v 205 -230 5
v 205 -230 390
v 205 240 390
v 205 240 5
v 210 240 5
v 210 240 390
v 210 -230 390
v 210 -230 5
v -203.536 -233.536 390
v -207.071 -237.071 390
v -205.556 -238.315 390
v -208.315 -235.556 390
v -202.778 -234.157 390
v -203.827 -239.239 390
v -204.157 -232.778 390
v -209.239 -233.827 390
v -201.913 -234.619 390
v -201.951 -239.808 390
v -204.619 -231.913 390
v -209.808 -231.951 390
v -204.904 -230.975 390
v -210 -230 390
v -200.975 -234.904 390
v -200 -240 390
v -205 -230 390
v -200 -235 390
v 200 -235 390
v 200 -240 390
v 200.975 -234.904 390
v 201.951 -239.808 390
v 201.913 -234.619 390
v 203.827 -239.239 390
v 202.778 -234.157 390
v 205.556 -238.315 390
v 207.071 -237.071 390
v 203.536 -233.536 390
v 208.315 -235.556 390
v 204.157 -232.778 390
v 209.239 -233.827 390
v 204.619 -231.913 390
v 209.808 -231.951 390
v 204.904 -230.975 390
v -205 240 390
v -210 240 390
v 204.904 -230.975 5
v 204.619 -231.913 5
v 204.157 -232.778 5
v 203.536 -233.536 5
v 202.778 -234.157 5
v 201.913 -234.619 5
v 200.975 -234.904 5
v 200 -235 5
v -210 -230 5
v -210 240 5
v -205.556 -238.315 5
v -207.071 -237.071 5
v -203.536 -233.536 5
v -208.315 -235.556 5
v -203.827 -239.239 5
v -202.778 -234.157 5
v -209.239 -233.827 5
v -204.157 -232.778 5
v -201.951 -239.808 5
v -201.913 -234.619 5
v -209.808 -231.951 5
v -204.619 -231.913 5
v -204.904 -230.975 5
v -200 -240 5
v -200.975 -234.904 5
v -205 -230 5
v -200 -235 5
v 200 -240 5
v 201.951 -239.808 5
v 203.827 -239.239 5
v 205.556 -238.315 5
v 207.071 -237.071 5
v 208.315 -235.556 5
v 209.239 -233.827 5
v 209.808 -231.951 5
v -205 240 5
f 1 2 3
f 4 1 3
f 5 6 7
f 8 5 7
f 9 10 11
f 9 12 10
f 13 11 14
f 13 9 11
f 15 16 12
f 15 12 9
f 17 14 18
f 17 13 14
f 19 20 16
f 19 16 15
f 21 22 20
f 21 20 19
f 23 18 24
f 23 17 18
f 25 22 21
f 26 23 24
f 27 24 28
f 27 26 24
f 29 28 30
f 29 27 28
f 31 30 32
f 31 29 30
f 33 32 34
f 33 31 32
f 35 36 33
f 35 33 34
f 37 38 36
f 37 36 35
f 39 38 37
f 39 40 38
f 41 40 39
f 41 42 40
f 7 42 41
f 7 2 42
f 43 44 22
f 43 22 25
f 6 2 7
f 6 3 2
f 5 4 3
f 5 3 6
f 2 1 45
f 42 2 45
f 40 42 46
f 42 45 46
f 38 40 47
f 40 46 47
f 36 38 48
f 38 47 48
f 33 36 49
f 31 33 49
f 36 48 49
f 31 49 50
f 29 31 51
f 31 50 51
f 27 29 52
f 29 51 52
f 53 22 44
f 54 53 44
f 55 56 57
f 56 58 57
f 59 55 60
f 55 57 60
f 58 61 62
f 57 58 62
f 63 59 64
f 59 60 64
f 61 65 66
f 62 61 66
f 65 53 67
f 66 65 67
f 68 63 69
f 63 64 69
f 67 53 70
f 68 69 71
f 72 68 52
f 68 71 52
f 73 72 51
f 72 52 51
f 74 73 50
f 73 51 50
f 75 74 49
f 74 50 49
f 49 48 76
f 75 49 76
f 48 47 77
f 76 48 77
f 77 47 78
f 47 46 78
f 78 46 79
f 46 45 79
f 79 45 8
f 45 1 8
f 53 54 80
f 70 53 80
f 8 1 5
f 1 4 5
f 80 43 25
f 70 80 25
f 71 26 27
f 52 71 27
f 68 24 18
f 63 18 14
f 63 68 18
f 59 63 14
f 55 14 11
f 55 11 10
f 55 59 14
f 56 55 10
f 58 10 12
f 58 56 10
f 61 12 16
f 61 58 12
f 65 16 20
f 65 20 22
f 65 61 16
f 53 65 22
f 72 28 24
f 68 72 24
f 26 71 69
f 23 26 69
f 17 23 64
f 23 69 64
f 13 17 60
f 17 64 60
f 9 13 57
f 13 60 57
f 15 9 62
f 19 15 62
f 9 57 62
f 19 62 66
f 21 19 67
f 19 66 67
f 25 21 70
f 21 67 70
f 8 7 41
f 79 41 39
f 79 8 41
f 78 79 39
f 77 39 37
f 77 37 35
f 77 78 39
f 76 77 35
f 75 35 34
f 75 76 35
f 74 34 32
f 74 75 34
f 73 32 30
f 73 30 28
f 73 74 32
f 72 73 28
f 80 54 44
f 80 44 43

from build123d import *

# Parameters (mm, degrees)
SKETCH_1_W            = 420
SKETCH_1_H            = 480
EXTRUDE_1_DEPTH       = 5
FILLET_1_R            = 5
EXTRUDE_START         = 385
EXTRUDE_3_DEPTH       = 385
CUT_EXTRUDE_START     = -5
CUT_EXTRUDE_2_DEPTH   = 5
SHEET_START           = 5
SHEET_METAL_1_DEPTH   = 385
SHEET_METAL_1_2_DEPTH = 385


# Read off the part's stored shape, not the designer's step: 转换实体1
with BuildPart() as part:
    # Sketch 1 → 凸台-拉伸1 (new body)
    with BuildSketch(Plane.XY):
        Rectangle(SKETCH_1_W, SKETCH_1_H)
    extrude(amount=EXTRUDE_1_DEPTH)

    # 圆角1
    fillet_1_edges = [part.edges().sort_by_distance(p)[0] for p in [
        (210, -240, 2.5),
        (-210, -240, 2.5),
    ]]
    fillet(fillet_1_edges, radius=FILLET_1_R)

    # 草图4 → 凸台-拉伸3 (add)
    with BuildSketch(Plane.XY.offset(5).offset(EXTRUDE_START)):
        with BuildLine():
            Line((-205, 240), (-205, -235))
            Line((-205, -235), (205, -235))
            Line((205, -235), (205, 240))
            Line((205, 240), (210, 240))
            Line((210, 240), (210, -235))
            ThreePointArc((210, -235), (208.535533906, -238.535533906), (205, -240))
            Line((205, -240), (-205, -240))
            ThreePointArc((-205, -240), (-208.535533906, -238.535533906), (-210, -235))
            Line((-210, -235), (-210, 240))
            Line((-210, 240), (-205, 240))
        make_face()
    extrude(amount=-EXTRUDE_3_DEPTH)

    # 草图5 → 切除-拉伸2 (cut)
    with BuildSketch(Plane(origin=(0, 0, 0), x_dir=(-1, 0, 0), z_dir=(0, 0, -1)).offset(CUT_EXTRUDE_START)):
        with BuildLine():
            Line((-205, -240), (205, -240))
            ThreePointArc((205, -240), (208.535533906, -238.535533906), (210, -235))
            Line((210, -235), (210, 240))
            Line((210, 240), (-210, 240))
            Line((-210, 240), (-210, -235))
            ThreePointArc((-210, -235), (-208.535533906, -238.535533906), (-205, -240))
        make_face()
    extrude(amount=CUT_EXTRUDE_2_DEPTH, mode=Mode.SUBTRACT)

    # Sheet Metal 1 outline → Sheet Metal 1 (cut)
    with BuildSketch(Plane.XY.offset(SHEET_START)):
        with BuildLine():
            Line((-205, -240), (-200, -240))
            ThreePointArc((-200, -240), (-207.071067812, -237.071067812), (-210, -230))
            Line((-210, -230), (-210, -235))
            ThreePointArc((-210, -235), (-208.535533906, -238.535533906), (-205, -240))
        make_face()
        with BuildLine():
            ThreePointArc((210, -230), (207.071067812, -237.071067812), (200, -240))
            Line((200, -240), (205, -240))
            ThreePointArc((205, -240), (208.535533906, -238.535533906), (210, -235))
            Line((210, -235), (210, -230))
        make_face()
    extrude(amount=SHEET_METAL_1_DEPTH, mode=Mode.SUBTRACT)

    # Sheet Metal 1 2 outline → Sheet Metal 1 2 (add)
    with BuildSketch(Plane.XY.offset(SHEET_START)):
        with BuildLine():
            Line((-205, -235), (-200, -235))
            ThreePointArc((-200, -235), (-203.535533906, -233.535533906), (-205, -230))
            Line((-205, -230), (-205, -235))
        make_face()
        with BuildLine():
            ThreePointArc((205, -230), (203.535533906, -233.535533906), (200, -235))
            Line((200, -235), (205, -235))
            Line((205, -235), (205, -230))
        make_face()
    extrude(amount=SHEET_METAL_1_2_DEPTH)


solid = part.part
